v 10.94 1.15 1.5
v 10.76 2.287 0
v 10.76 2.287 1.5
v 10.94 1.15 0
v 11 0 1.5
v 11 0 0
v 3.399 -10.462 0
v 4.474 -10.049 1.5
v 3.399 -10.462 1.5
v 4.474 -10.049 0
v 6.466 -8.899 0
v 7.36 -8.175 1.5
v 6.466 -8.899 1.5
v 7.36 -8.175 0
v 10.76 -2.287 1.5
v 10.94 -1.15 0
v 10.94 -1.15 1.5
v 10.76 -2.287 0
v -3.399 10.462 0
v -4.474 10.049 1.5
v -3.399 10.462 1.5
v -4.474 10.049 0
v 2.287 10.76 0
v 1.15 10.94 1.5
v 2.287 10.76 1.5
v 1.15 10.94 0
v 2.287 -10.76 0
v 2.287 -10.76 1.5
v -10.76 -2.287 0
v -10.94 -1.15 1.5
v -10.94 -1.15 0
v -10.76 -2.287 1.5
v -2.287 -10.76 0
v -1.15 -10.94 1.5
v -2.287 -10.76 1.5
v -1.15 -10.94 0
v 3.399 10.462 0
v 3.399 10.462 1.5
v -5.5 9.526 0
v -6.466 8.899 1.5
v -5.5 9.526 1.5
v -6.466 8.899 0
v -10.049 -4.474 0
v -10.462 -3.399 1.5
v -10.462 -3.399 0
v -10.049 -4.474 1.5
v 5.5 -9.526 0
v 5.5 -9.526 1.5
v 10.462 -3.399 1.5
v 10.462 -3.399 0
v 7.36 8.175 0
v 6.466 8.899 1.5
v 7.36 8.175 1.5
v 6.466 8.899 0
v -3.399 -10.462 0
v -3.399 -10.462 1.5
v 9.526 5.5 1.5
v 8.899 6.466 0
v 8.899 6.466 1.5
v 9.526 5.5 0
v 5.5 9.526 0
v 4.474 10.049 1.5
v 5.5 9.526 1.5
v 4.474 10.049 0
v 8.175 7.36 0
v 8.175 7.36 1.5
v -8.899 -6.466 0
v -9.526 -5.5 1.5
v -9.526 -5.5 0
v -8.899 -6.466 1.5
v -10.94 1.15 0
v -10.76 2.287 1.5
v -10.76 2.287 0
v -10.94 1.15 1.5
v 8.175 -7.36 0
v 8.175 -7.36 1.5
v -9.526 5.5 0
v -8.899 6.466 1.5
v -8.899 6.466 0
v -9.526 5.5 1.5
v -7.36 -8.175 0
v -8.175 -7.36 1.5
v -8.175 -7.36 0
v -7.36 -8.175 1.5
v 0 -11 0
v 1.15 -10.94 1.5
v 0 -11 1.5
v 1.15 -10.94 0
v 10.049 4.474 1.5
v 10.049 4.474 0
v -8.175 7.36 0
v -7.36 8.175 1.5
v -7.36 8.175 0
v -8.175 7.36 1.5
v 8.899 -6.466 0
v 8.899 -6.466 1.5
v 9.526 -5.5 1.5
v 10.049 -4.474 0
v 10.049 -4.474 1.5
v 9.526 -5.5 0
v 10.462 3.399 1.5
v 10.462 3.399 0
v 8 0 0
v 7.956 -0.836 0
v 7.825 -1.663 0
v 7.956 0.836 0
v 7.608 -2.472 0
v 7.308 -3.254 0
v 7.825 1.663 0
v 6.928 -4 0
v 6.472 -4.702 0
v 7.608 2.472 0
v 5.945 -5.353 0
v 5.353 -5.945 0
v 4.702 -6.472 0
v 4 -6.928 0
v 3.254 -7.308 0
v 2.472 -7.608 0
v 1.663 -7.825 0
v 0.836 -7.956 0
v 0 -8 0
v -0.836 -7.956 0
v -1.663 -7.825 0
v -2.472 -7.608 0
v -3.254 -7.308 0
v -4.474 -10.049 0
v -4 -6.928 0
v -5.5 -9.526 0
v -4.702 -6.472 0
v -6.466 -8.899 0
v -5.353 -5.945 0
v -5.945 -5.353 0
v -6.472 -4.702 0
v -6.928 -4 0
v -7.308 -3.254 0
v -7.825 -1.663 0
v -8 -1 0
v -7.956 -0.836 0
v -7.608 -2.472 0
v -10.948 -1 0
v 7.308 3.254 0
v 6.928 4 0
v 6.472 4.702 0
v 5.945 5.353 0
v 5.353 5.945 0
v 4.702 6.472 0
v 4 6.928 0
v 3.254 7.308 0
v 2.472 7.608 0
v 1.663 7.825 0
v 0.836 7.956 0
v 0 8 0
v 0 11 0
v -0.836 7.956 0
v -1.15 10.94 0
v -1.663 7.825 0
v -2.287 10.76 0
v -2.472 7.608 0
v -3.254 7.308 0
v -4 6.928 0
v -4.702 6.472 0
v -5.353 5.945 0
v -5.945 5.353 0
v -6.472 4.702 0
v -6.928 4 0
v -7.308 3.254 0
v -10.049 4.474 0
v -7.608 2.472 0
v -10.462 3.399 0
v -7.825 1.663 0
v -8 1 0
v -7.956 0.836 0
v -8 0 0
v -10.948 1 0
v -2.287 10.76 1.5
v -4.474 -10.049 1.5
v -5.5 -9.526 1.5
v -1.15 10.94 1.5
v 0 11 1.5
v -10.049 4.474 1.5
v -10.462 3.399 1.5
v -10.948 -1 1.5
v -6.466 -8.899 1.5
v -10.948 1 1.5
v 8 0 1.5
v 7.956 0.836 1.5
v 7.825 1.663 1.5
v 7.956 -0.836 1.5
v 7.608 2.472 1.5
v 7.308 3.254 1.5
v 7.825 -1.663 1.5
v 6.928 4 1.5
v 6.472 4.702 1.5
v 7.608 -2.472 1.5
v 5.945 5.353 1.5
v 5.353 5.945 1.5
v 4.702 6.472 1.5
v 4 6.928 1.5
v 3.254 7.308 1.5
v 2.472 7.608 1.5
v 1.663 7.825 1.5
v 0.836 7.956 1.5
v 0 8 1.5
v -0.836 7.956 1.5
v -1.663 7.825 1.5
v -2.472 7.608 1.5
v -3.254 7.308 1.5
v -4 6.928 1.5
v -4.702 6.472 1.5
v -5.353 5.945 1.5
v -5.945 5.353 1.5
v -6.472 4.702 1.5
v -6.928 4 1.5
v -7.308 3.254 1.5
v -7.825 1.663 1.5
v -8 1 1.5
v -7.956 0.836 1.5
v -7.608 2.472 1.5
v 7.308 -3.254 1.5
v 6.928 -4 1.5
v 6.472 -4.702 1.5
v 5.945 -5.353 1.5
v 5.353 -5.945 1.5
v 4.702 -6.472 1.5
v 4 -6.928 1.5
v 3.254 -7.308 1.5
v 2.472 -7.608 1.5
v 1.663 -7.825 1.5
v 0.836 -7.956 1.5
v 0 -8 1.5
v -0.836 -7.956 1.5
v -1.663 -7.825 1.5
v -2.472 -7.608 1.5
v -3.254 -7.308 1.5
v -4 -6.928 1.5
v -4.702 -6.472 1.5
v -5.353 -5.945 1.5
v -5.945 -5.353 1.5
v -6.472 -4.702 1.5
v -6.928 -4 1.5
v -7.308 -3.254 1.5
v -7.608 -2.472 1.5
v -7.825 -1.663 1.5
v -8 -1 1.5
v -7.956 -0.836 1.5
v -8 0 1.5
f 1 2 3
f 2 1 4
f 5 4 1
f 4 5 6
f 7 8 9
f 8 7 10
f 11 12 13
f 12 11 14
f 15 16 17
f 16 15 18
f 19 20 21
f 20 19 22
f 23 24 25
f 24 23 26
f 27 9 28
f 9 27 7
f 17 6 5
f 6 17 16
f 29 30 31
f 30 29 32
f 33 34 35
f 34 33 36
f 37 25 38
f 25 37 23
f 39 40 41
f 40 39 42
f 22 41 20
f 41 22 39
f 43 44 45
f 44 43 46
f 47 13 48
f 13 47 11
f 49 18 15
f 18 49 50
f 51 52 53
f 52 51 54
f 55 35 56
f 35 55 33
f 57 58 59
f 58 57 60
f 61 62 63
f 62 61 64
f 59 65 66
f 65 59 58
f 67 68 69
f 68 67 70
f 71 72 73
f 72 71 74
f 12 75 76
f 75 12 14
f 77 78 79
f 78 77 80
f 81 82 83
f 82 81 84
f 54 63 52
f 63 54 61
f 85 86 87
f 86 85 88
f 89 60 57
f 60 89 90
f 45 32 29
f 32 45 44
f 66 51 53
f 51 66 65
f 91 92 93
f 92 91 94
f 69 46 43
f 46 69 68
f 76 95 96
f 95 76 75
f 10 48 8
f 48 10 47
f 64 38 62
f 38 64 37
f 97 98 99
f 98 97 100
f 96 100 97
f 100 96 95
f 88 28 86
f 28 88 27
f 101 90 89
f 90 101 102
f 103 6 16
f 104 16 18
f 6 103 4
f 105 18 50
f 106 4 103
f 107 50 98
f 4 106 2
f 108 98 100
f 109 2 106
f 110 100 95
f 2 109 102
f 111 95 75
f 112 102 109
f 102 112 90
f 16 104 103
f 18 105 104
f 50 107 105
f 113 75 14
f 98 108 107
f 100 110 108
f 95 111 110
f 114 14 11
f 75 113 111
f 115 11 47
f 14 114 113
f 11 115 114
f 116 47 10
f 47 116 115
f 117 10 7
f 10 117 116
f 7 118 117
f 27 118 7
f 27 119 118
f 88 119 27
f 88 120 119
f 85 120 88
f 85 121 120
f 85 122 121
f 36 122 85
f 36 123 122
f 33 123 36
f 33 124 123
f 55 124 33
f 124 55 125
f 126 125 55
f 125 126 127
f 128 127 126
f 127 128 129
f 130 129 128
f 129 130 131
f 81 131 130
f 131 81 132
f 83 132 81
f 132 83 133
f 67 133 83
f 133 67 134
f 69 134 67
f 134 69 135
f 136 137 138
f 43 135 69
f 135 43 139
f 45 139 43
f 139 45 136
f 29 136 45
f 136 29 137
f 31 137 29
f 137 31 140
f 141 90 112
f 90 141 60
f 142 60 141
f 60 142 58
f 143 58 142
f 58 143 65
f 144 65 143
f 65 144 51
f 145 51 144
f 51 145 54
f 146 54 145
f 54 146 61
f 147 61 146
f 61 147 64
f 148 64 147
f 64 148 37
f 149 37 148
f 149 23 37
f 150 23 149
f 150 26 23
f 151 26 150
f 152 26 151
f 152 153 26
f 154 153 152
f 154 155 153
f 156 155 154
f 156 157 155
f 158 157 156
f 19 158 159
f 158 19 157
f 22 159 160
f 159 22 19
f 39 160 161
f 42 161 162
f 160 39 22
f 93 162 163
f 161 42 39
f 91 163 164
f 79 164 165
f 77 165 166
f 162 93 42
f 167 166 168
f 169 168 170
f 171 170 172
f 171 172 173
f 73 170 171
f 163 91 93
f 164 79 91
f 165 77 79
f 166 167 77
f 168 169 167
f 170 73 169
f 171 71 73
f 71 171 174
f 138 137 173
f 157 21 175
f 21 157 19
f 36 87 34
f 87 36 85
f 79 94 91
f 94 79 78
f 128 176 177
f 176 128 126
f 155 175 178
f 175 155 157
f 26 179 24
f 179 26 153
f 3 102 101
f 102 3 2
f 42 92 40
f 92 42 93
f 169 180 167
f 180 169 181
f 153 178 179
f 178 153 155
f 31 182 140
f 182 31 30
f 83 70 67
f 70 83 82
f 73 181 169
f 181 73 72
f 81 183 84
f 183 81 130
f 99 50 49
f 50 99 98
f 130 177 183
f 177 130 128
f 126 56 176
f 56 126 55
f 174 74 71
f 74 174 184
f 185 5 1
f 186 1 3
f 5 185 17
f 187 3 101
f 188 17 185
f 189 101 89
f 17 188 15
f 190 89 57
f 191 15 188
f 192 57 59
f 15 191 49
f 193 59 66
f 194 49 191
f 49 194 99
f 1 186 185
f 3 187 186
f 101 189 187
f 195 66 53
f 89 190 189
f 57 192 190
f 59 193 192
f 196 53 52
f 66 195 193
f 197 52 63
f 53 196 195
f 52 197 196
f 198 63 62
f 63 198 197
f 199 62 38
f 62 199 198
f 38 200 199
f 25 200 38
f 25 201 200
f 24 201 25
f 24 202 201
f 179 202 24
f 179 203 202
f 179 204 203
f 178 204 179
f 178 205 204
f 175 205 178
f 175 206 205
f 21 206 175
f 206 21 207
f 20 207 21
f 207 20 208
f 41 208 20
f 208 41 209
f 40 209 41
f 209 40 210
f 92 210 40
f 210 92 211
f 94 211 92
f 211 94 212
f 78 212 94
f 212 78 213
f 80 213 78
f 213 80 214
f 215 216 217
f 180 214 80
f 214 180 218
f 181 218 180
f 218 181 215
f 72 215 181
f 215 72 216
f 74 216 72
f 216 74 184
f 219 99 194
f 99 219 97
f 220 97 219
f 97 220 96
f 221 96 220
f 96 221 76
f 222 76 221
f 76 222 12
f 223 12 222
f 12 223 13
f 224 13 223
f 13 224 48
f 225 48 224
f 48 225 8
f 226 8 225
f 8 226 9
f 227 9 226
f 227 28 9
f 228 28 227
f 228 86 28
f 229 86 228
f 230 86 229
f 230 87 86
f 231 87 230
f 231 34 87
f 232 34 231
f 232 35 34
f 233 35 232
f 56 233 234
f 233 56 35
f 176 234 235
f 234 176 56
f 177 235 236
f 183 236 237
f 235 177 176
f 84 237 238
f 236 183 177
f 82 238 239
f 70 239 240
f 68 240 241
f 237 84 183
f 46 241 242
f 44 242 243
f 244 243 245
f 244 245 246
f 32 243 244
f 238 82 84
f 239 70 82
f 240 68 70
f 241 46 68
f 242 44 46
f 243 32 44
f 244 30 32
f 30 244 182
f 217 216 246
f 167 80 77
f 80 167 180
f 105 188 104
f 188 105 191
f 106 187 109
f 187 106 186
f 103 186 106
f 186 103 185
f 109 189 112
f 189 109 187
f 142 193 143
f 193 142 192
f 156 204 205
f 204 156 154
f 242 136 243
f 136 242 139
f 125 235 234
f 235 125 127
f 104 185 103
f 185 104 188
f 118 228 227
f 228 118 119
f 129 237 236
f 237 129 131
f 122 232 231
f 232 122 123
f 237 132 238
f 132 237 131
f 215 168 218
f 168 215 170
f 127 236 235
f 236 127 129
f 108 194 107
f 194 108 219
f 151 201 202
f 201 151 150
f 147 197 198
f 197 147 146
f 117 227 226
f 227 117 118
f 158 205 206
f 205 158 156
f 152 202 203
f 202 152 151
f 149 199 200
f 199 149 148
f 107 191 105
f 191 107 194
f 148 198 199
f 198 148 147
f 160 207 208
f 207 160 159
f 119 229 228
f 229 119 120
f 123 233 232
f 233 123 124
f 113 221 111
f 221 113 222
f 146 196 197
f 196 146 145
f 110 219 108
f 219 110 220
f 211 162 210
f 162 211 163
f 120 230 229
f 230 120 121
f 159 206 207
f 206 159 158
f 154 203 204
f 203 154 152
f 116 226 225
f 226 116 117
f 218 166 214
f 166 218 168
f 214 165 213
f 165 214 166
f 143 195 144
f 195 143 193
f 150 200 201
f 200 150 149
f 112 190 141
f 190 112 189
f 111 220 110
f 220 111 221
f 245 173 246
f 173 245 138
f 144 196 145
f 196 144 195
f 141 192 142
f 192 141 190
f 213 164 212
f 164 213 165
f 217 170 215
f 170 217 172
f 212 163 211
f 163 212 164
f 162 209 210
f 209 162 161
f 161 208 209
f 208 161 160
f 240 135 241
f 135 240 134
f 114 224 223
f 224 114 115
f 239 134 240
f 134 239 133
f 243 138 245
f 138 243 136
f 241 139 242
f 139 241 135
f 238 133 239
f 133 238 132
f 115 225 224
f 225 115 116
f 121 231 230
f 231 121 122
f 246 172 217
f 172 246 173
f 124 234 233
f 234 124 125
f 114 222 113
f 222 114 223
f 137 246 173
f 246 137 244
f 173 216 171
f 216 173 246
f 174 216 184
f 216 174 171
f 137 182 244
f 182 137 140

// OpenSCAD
// Internal retaining ring.
$fn = 60;
eps = 0.02;
inner_d = 16;
outer_d = 22;
thickness = max(1.2, 1.5);
difference() { cylinder(d=outer_d,h=thickness); translate([0,0,-eps]) cylinder(d=inner_d,h=thickness+2*eps); translate([-outer_d/2-eps,-1,-eps]) cube([outer_d/2-inner_d/2+eps,2,thickness+2*eps]); }
